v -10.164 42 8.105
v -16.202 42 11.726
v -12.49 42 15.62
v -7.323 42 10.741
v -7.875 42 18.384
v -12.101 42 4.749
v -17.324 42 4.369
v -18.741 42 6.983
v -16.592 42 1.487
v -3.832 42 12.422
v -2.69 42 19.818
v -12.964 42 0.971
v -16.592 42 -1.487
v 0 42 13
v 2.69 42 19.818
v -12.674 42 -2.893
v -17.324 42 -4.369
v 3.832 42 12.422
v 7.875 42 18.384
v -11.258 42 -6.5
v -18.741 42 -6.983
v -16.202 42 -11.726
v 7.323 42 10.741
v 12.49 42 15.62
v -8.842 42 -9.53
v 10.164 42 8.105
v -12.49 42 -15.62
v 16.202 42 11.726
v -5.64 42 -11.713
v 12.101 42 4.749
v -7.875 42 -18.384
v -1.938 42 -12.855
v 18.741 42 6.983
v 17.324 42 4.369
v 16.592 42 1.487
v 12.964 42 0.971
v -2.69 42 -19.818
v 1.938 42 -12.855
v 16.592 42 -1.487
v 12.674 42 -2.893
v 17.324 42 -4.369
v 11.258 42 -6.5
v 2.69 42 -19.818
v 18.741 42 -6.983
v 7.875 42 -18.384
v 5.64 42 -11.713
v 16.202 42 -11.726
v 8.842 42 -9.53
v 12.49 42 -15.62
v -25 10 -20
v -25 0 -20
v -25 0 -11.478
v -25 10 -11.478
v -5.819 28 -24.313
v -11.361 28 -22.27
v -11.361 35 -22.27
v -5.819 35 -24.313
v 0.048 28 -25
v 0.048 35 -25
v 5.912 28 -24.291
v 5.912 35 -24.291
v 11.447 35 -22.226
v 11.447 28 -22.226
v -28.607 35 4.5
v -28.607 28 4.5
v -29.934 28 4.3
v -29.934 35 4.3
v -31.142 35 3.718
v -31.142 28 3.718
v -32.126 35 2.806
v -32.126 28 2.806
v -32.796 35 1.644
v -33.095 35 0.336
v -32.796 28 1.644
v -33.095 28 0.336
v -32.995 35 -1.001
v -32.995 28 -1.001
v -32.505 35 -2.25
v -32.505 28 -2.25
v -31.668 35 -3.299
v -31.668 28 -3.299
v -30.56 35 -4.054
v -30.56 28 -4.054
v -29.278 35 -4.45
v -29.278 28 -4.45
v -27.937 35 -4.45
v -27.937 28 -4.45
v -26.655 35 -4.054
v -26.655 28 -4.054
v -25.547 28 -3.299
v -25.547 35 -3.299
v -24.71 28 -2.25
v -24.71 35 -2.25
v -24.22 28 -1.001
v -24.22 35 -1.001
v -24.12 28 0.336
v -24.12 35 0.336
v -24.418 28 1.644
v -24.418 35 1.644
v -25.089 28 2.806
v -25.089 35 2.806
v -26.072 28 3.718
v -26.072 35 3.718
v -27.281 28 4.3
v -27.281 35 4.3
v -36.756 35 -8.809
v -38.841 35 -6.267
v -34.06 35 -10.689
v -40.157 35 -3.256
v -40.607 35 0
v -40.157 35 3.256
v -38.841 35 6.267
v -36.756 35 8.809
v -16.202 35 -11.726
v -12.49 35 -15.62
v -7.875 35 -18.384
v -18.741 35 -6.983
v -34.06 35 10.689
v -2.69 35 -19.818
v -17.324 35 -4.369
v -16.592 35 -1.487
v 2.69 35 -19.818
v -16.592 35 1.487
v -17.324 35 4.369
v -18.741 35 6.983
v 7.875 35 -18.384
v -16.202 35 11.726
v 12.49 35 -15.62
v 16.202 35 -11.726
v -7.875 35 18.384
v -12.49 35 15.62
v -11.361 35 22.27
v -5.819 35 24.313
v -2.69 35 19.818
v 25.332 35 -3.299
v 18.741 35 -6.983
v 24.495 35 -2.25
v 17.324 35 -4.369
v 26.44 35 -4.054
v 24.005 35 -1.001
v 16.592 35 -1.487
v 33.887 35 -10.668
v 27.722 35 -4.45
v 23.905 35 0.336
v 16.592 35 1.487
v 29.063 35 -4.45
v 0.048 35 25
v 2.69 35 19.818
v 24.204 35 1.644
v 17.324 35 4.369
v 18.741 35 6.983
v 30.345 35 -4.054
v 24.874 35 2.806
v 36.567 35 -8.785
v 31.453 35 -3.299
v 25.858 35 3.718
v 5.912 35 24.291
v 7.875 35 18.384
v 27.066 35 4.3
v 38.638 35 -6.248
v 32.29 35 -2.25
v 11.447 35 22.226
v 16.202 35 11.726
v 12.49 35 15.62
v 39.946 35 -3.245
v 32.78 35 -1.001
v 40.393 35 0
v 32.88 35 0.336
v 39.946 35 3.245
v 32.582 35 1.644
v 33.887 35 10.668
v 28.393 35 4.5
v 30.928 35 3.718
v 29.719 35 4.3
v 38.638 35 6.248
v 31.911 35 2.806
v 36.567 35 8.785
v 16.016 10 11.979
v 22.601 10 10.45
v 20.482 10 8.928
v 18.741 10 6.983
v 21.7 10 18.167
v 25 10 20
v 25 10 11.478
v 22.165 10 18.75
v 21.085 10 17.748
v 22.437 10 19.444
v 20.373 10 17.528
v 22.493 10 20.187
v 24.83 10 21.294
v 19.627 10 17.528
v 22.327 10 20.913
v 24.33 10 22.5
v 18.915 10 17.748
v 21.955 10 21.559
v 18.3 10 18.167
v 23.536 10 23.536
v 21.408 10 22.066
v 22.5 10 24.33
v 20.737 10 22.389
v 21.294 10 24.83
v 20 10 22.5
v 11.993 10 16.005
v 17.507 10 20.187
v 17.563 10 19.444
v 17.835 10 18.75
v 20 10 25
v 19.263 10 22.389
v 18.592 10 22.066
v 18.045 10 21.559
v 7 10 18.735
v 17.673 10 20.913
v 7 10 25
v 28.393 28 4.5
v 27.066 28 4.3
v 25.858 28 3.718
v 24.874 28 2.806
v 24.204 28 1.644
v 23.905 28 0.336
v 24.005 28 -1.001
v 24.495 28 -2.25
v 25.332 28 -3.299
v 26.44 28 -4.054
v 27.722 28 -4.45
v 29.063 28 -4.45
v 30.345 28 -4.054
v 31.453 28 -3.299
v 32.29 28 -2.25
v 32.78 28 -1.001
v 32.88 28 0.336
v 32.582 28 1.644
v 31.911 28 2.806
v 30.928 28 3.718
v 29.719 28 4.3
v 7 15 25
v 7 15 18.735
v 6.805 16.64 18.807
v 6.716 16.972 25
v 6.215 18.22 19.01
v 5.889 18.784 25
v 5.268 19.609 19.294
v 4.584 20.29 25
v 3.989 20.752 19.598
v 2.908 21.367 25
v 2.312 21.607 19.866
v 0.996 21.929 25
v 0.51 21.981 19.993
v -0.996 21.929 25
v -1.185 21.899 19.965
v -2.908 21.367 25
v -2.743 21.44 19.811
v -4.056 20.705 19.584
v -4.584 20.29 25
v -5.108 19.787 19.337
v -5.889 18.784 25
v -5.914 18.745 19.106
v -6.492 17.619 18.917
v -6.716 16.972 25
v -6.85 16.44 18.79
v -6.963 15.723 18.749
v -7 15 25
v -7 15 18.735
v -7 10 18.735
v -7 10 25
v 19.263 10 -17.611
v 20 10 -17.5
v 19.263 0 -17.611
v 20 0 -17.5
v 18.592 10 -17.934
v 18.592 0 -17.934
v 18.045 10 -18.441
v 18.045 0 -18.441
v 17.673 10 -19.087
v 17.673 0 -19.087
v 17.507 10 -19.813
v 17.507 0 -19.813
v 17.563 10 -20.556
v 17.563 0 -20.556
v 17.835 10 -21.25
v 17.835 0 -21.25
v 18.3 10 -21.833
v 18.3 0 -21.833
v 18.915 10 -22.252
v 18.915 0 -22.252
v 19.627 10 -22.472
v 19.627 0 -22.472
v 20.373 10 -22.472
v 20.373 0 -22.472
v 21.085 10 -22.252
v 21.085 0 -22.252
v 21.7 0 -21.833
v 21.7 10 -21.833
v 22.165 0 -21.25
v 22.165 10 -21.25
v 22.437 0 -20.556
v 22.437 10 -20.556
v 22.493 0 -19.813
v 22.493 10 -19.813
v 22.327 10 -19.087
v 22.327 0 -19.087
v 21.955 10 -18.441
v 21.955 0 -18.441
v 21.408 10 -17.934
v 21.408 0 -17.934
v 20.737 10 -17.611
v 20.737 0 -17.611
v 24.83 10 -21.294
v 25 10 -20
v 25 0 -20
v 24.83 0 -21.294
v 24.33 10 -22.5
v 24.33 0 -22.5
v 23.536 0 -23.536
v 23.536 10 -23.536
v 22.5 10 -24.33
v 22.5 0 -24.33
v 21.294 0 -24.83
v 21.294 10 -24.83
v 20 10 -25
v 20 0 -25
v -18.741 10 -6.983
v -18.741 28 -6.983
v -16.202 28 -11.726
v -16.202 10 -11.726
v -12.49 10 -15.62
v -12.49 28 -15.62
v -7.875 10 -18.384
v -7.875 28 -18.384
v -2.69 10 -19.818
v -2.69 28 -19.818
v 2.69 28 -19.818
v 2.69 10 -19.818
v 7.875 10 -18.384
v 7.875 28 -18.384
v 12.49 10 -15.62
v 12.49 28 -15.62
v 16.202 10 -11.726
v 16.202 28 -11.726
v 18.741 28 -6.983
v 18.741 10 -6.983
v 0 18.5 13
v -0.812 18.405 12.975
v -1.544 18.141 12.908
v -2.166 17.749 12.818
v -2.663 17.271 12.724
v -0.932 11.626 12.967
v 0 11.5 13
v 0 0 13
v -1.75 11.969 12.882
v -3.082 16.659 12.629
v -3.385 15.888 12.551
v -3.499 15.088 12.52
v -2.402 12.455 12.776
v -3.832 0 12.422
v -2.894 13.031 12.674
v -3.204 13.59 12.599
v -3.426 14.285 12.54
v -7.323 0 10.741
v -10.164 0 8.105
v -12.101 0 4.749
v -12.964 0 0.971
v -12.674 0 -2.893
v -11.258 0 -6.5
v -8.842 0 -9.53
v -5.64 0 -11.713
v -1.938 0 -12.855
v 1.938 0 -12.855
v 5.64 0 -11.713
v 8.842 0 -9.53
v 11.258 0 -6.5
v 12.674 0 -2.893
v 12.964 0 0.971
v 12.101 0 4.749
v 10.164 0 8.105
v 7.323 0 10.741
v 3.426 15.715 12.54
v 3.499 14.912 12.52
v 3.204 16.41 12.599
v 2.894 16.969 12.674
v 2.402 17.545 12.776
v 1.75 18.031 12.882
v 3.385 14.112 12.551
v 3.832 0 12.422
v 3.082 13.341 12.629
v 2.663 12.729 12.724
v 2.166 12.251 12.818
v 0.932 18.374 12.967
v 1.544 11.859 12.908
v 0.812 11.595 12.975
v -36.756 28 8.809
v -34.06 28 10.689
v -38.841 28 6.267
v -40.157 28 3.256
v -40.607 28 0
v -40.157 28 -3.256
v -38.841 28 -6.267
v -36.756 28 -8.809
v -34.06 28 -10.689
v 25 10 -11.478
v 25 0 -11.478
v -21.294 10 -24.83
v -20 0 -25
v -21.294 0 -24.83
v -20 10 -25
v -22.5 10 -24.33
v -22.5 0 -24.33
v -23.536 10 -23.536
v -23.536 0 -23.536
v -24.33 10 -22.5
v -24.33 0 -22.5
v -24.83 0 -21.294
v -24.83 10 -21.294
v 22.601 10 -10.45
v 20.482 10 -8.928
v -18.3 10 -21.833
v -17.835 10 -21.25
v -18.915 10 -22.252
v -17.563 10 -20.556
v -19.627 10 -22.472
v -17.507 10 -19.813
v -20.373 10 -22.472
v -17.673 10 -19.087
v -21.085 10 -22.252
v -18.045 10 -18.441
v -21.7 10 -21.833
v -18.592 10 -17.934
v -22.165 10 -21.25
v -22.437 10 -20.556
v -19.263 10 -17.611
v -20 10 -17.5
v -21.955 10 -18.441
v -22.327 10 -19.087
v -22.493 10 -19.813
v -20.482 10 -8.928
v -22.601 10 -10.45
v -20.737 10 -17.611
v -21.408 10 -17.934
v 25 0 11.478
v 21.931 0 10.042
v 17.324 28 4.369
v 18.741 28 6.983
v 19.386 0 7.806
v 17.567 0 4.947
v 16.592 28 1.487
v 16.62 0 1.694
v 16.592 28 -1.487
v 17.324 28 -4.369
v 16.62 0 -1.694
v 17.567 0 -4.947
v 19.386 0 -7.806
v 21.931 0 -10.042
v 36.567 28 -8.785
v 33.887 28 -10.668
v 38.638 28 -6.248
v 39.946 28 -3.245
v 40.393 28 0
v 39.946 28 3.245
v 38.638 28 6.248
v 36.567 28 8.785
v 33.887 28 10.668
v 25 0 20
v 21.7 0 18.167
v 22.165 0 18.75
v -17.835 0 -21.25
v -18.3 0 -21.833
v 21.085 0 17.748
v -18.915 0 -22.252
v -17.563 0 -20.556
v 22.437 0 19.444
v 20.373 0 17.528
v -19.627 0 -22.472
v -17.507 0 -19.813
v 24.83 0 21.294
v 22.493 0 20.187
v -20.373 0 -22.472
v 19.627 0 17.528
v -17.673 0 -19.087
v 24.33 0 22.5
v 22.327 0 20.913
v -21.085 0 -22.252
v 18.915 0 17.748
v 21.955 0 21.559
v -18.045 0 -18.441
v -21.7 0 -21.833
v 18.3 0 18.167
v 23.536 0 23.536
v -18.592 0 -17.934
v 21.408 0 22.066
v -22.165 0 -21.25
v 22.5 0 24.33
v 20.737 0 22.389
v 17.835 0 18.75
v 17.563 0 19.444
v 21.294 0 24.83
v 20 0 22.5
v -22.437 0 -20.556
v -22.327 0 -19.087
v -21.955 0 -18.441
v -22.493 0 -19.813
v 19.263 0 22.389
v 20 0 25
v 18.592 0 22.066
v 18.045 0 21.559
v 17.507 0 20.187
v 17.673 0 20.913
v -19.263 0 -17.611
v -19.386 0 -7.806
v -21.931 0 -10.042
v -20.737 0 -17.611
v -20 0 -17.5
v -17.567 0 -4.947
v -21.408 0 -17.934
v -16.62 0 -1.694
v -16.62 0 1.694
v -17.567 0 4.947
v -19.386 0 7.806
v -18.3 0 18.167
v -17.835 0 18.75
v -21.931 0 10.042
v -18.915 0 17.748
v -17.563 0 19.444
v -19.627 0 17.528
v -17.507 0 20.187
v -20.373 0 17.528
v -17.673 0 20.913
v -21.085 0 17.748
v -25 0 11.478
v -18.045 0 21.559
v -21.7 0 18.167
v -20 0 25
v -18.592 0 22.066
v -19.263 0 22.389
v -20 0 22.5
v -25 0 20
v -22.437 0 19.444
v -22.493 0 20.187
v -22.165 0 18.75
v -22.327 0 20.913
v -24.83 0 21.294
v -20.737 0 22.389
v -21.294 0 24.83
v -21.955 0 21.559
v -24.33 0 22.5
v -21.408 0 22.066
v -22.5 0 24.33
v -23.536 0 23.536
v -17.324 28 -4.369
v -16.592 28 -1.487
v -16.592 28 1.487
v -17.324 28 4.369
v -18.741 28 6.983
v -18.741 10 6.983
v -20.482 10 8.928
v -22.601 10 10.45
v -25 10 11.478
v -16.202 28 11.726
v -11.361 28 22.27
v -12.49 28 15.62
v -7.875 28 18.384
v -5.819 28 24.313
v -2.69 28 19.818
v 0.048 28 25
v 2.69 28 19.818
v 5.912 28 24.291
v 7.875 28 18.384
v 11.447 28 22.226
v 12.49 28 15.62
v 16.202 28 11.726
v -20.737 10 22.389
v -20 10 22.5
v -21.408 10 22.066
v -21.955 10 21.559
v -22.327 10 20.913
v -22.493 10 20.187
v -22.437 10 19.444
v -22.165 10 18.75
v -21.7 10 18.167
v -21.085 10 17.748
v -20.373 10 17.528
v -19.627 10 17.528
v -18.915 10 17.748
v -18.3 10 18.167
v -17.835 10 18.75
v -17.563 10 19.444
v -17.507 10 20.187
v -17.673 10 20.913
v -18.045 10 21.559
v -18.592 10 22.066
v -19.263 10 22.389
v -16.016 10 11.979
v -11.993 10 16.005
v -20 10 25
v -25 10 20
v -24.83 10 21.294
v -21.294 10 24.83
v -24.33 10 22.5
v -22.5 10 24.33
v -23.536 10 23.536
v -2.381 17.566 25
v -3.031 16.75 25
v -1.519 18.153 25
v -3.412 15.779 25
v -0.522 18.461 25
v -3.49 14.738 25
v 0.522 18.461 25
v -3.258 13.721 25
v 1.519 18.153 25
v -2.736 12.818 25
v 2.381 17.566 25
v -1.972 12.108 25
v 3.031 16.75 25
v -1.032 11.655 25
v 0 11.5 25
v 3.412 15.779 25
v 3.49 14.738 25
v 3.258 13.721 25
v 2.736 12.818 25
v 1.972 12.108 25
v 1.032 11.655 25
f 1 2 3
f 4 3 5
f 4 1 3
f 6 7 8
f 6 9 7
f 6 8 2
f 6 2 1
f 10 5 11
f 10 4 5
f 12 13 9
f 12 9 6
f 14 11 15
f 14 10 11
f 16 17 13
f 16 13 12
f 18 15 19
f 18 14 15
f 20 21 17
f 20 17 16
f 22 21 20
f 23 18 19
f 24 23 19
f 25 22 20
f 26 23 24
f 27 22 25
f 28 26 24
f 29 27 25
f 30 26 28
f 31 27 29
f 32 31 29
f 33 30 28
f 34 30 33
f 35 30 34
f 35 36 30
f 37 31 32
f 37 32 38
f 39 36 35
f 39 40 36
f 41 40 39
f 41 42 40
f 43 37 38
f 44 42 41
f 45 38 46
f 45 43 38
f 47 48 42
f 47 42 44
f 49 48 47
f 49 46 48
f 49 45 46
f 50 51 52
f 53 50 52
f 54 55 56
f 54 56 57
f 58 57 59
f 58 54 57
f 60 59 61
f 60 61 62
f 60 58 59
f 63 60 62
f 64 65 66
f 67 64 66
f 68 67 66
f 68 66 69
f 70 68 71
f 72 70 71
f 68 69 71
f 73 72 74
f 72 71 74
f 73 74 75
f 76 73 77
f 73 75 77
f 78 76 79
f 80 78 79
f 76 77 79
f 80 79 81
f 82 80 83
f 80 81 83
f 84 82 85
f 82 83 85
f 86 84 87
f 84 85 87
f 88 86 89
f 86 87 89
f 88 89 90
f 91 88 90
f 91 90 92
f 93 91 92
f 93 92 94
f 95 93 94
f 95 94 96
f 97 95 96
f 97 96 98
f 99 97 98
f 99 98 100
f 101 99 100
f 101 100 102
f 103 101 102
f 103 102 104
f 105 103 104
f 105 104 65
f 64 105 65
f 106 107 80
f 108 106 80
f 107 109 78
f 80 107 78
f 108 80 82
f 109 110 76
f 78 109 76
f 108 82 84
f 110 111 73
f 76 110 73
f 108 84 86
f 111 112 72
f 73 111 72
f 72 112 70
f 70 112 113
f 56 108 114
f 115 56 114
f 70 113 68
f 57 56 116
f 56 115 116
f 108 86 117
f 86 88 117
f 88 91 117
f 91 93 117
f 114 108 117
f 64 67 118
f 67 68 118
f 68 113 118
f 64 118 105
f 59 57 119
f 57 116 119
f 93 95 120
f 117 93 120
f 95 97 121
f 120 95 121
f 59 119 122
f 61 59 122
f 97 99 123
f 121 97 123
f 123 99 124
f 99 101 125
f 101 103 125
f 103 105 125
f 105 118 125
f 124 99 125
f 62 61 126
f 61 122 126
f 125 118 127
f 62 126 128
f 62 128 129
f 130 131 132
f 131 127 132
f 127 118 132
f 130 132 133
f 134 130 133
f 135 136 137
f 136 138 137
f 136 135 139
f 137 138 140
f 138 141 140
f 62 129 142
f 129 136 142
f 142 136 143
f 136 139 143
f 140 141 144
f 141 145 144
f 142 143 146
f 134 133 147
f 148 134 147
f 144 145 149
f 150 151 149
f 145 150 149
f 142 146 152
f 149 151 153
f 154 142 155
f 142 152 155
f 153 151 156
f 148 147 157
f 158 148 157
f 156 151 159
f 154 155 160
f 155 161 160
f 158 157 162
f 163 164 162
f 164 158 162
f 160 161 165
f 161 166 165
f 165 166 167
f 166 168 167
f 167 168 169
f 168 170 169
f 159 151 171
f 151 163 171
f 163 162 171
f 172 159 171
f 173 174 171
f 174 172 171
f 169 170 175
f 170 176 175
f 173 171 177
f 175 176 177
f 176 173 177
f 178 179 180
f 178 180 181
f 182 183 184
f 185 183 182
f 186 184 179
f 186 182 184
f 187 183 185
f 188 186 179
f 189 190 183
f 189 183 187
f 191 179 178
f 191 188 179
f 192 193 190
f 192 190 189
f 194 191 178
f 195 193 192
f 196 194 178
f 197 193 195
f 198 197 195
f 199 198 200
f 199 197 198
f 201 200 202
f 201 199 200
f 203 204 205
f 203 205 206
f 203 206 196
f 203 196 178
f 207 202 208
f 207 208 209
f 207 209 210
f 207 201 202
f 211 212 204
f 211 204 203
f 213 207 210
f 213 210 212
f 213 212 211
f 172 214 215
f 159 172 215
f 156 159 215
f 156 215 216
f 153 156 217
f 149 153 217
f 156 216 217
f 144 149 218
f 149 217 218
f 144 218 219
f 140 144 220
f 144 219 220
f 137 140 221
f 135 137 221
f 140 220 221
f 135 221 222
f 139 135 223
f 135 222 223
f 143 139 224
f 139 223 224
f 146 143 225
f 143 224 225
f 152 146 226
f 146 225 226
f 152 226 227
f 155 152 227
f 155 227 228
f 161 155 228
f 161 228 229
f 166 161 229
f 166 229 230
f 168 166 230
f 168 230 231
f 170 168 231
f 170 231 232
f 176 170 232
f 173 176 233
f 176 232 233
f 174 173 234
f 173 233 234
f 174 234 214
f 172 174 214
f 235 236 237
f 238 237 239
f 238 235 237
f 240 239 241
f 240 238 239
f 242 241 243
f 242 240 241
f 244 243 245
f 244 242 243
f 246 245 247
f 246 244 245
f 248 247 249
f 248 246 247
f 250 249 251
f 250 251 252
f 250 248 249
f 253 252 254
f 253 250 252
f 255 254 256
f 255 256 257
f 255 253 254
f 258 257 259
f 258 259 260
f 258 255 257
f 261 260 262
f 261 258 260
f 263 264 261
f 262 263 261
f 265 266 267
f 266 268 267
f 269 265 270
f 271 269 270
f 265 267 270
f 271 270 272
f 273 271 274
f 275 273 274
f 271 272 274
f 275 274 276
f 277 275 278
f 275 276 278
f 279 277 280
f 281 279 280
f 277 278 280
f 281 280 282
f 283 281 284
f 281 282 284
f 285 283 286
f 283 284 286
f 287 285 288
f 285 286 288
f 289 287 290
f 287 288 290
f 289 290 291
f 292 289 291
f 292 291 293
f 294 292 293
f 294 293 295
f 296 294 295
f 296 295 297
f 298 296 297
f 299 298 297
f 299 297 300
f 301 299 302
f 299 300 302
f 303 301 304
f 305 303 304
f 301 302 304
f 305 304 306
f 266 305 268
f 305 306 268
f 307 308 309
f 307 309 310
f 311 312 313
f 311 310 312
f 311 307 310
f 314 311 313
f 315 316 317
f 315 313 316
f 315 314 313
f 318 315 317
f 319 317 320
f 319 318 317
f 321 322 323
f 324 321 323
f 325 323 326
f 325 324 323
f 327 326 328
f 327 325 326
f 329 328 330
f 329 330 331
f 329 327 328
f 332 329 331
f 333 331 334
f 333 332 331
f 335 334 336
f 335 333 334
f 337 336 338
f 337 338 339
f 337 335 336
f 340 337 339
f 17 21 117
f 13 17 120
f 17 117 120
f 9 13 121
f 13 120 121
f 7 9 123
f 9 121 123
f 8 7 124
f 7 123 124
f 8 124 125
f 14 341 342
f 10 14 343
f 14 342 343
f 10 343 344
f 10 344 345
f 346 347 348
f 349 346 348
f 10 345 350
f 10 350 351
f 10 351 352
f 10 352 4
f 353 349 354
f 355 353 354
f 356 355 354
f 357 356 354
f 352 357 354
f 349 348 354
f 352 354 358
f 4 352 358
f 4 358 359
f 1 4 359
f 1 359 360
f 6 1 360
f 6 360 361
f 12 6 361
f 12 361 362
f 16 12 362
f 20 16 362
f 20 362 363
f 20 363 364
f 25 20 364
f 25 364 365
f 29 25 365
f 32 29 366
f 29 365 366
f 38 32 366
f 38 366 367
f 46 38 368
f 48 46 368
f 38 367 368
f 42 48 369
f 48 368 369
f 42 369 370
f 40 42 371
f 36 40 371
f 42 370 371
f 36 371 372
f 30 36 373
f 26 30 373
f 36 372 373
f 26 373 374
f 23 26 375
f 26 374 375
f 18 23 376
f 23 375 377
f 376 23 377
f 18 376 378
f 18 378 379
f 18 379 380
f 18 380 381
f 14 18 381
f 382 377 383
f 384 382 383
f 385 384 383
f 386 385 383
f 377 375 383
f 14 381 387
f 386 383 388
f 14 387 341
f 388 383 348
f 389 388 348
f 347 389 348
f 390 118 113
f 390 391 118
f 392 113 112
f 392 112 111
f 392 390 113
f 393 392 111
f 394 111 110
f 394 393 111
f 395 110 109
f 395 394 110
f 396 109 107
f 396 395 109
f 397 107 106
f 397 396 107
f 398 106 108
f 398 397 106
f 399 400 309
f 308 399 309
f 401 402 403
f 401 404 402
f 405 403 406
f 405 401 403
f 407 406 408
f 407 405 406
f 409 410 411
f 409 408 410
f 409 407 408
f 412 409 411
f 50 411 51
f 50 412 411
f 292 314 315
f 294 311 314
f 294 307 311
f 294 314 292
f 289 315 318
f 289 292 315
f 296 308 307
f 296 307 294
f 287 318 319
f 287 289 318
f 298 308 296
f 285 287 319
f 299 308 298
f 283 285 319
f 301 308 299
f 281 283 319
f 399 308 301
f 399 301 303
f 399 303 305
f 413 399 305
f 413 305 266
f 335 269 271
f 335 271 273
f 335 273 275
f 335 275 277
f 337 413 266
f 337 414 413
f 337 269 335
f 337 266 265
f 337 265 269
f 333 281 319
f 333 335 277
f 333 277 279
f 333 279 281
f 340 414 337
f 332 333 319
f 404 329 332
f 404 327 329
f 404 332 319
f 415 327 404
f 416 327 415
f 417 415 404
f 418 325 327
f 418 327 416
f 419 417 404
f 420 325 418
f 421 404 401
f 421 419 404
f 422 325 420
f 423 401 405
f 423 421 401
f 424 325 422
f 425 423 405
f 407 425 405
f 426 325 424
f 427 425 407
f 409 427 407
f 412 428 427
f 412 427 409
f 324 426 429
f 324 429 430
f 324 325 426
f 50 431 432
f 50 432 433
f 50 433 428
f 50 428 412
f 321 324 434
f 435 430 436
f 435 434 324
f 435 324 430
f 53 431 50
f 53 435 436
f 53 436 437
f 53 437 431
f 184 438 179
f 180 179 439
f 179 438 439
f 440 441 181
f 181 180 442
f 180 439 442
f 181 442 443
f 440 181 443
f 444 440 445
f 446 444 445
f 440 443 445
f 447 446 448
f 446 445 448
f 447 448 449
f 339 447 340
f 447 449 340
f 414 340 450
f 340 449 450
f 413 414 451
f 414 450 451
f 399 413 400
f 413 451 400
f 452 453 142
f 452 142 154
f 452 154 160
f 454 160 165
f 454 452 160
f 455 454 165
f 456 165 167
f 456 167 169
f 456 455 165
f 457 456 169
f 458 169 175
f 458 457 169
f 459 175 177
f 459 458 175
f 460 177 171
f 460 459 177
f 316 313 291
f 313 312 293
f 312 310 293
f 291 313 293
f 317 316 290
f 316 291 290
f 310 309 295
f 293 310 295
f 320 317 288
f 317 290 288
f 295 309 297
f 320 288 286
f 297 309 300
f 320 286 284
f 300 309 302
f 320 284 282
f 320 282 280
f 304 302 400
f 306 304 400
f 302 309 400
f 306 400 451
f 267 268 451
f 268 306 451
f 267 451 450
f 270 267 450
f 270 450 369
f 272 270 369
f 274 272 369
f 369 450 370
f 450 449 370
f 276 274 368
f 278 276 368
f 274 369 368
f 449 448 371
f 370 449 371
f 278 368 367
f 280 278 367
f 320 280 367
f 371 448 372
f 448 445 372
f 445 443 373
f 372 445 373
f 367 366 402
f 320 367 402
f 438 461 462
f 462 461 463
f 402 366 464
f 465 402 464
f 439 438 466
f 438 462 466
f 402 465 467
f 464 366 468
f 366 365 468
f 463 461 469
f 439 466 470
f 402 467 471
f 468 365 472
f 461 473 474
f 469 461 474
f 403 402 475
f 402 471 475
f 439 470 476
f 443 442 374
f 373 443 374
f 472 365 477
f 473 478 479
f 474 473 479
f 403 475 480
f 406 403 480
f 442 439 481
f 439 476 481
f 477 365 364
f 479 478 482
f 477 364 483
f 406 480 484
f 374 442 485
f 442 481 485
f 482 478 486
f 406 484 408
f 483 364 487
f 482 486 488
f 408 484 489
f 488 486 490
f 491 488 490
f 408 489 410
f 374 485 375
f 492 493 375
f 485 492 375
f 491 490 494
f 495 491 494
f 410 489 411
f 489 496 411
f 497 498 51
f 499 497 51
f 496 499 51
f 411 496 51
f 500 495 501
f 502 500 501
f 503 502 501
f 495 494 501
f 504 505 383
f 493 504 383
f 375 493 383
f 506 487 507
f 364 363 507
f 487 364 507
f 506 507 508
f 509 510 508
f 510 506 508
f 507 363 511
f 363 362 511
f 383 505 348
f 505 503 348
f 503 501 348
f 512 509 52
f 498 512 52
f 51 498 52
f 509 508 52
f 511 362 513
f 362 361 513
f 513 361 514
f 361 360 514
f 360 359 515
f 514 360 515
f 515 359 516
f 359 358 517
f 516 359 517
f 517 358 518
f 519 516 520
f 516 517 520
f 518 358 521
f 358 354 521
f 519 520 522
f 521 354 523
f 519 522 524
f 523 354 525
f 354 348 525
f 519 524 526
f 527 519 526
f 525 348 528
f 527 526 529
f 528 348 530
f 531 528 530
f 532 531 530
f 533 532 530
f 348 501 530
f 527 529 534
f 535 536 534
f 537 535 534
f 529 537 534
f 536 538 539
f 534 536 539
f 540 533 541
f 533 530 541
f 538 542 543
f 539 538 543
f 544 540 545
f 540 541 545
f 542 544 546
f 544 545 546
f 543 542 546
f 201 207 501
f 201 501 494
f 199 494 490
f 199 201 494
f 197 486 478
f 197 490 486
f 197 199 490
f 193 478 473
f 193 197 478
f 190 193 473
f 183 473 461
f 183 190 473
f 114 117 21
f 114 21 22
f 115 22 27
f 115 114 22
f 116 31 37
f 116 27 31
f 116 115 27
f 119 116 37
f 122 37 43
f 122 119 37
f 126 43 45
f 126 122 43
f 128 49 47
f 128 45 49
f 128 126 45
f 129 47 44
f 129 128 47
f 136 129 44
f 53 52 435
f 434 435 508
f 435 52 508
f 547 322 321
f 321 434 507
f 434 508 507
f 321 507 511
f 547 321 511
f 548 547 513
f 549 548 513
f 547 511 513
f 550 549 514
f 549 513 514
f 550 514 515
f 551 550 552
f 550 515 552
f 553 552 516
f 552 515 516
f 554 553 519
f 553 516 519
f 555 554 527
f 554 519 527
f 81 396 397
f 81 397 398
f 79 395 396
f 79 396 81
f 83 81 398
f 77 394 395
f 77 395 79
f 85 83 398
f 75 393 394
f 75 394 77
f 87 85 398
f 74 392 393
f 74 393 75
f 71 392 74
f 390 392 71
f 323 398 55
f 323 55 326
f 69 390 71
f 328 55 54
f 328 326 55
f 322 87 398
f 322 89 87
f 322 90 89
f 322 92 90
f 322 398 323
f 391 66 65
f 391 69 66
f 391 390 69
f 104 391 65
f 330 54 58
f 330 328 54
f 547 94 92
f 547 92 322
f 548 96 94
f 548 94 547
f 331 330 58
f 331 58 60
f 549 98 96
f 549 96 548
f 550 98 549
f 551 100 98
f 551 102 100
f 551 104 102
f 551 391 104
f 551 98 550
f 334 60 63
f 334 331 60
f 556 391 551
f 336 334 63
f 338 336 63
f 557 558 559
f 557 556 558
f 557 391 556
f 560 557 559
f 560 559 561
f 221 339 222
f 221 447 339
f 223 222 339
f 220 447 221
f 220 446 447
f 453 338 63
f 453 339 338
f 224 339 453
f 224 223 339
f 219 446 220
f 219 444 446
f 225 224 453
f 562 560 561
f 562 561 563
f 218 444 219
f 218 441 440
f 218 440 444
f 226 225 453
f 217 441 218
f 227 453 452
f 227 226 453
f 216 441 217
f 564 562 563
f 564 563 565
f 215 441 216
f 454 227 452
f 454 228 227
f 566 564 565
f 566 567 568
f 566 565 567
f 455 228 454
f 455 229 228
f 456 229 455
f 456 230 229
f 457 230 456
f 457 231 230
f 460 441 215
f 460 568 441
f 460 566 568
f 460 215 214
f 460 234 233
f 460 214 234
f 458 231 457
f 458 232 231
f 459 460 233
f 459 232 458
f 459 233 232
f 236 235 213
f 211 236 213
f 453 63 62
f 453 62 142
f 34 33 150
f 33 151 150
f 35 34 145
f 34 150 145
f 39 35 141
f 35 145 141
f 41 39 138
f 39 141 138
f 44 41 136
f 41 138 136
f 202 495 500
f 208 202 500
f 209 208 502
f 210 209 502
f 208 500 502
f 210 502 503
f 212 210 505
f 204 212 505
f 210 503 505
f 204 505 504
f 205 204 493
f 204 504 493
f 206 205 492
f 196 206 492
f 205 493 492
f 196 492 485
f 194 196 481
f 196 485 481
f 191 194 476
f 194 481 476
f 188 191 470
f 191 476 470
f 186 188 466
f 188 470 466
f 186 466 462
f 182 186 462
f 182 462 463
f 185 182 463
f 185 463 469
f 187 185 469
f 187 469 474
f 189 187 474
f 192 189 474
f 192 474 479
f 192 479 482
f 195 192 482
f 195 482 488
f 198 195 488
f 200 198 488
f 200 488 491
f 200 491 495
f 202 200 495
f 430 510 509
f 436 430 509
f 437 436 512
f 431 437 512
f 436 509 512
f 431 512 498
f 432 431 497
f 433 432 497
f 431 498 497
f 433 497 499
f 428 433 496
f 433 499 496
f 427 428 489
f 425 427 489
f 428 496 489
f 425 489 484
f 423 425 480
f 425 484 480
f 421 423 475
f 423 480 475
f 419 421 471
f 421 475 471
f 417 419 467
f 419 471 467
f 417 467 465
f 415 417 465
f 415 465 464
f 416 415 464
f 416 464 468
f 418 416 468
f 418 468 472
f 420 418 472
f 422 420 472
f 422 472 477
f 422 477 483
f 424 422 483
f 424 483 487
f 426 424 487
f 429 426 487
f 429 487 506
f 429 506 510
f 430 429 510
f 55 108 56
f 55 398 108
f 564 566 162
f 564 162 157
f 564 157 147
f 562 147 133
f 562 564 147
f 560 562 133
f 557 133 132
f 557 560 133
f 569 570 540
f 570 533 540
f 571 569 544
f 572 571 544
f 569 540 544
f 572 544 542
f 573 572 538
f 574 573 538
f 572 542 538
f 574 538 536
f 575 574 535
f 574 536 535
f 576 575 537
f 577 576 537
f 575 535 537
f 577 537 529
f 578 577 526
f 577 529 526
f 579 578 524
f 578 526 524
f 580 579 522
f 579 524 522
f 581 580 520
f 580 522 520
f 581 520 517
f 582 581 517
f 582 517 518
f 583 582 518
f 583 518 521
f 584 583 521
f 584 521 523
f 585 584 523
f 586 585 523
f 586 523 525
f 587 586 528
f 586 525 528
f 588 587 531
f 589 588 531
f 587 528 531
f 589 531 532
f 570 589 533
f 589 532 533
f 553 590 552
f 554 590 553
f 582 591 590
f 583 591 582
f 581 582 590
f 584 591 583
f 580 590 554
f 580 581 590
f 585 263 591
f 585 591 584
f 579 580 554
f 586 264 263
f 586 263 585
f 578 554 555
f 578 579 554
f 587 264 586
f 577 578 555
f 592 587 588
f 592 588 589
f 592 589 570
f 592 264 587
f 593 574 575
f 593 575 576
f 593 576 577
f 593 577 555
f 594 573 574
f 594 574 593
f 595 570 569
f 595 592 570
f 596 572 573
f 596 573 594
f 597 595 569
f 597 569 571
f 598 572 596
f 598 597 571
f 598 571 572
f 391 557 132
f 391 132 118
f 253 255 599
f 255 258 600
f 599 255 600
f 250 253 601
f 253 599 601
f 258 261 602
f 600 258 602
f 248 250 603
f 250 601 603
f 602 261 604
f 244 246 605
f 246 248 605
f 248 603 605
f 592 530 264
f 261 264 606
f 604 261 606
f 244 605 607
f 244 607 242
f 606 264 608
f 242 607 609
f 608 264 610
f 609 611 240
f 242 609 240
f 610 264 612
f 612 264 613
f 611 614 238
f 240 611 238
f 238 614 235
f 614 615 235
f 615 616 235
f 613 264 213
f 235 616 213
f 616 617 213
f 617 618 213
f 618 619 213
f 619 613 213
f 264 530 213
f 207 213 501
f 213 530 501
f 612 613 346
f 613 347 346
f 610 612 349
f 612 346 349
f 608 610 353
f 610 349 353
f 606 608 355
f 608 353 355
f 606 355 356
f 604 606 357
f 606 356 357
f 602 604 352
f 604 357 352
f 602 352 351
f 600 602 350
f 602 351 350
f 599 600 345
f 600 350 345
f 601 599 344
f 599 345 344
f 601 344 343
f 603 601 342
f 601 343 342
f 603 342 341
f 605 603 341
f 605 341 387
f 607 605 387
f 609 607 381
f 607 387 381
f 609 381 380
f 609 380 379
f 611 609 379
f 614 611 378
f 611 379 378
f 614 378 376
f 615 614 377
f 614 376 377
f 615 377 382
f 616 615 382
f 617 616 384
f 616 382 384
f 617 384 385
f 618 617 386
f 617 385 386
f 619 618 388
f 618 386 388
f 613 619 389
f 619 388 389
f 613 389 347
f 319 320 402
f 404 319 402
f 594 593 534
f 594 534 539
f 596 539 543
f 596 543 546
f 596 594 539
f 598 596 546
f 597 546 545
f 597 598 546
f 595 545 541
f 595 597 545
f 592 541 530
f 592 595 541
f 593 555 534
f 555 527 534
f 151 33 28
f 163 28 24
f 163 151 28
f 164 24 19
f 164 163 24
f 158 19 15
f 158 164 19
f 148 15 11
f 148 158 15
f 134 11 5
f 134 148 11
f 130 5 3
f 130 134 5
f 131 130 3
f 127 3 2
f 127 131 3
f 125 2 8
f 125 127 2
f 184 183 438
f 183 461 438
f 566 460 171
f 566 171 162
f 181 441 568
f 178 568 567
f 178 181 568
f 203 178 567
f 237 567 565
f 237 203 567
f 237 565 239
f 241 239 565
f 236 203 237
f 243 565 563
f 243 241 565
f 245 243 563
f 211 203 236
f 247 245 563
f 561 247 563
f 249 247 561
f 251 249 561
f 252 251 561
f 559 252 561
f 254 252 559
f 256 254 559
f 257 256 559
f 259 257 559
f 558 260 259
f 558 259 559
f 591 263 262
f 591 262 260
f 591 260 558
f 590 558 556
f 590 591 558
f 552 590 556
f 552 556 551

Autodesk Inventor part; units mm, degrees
ref_plane "YZ Plane" through (0, 0, 0) normal (1, 0, 0) x (0, 1, 0)
ref_plane "XZ Plane" through (0, 0, 0) normal (0, 1, 0) x (-1, 0, 0)
sketch "Sketch1" plane through (0, 0, 0) normal (0, 1, 0) x (-1, 0, 0)
  line L0 (25, 25) -> (-25, 25)
  line L1 (-25, 25) -> (-25, -25)
  line L2 (-25, -25) -> (25, -25)
  line L3 (25, -25) -> (25, 25)
  line L4 (25, 25) -> (-25, -25) construction
  line L5 (-25, 25) -> (25, -25) construction
  point P0 (0, 0)
  dimension "d0" = 50
  dimension "d1" = 50
extrude "Extrusion1" add sketch "Sketch1" along normal blind 10
fillet "Fillet1" radius 5 4 edges at (-25, 5, -25) (-25, 5, 25) (25, 5, -25) (25, 5, 25)
sketch "Sketch2" plane through (0, 10, 0) normal (0, 1, 0) x (1, 0, 0)
  circle A0 centre (0, 0) radius 20
  dimension "d5" = 40
extrude "Extrusion2" add sketch "Sketch2" along normal blind 32
sketch "Sketch4" plane through (0, 0, 0) normal (0, -1, 0) x (1, 0, 0)
  circle A0 centre (-28.5, 0) radius 12
  line L0 (0, -36.4497) -> (0, 36.4497) projected
  circle A1 centre (28.5, 0) radius 12
  point P0 (0, 0)
  dimension "d14" = 12
  dimension "d15" = 57
extrude "Extrusion4" cut sketch "Sketch4" against normal through all
ref_plane "Work Plane1" through (0, 28, 0) normal (0, -1, 0) x (1, 0, 0)
sketch "Sketch3" plane through (0, 28, 0) normal (0, -1, 0) x (1, 0, 0)
  line L0 (-34.0605, -10.6894) -> (-11.3607, -22.2696)
  arc A0 (-11.3607, -22.2696) -> (11.4466, -22.2255) centre (0, 0) ccw
  line L1 (11.4466, -22.2255) -> (33.887, -10.6683)
  line L2 (33.887, -10.6683) -> (33.887, -10.6683)
  arc A1 (33.887, -10.6683) -> (33.887, 10.6683) centre (28.3926, 0) ccw
  line L3 (33.887, 10.6683) -> (11.4466, 22.2255)
  arc A2 (11.4466, 22.2255) -> (-11.3607, 22.2696) centre (0, 0) ccw
  arc A3 (-34.0605, 10.6894) -> (-34.0605, -10.6894) centre (-28.6074, 0) ccw
  line L4 (-11.3607, 22.2696) -> (-34.0605, 10.6894)
  dimension "d9" = 25
  dimension "d10" = 12
  dimension "d11" = 57
extrude "Extrusion3" add sketch "Sketch3" against normal blind 7
sketch "Sketch5" plane through (0, 42, 0) normal (0, 1, 0) x (1, 0, 0)
  arc A0 (18.7412, 6.9833) -> (-18.7412, 6.9833) centre (0, 0) ccw projected
hole "Hole1" at (0, 42, 0) direction (0, -1, 0) diameter 26 end through all
sketch "Sketch6" plane through (-20, 0, 25) normal (0, 0, 1) x (1, 0, 0)
  line L0 (0, 10) -> (40, 10) projected
  line L1 (0, 0) -> (40, 0) projected
  line L2 (1.2588, 10) -> (38.7412, 10) projected
  line L3 (13, 10) -> (13, 15)
  arc A0 (27, 15) -> (13, 15) centre (20, 15) ccw
  line L4 (27, 15) -> (27, 10)
  point P0 (20, 0)
  point P1 (20, 0)
  point P2 (20, 0)
  dimension "d25" = 7
  dimension "d26" = 15
extrude "Extrusion5" add sketch "Sketch6" against normal up to surface
sketch "Sketch7" plane through (-20, 0, 25) normal (0, 0, 1) x (1, 0, 0)
  arc A0 (27, 15) -> (13, 15) centre (20, 15) ccw projected
  point P0 (20, 0)
hole "Hole2" at (0, 15, 25) direction (0, 0, -1) diameter 7 end up to surface
sketch "Sketch8" plane through (0, 10, 0) normal (0, 1, 0) x (1, 0, 0)
  arc A0 (-25, -20) -> (-20, -25) centre (-20, -20) ccw projected
  arc A1 (25, 11.4782) -> (18.7412, 6.9833) centre (28.5, 0) ccw projected
  line L0 (25, 11.4782) -> (25, 20) projected
  arc A2 (25, 20) -> (20, 25) centre (20, 20) ccw projected
  line L1 (20, 25) -> (-20, 25) projected
  arc A3 (-20, 25) -> (-25, 20) centre (-20, 20) ccw projected
  line L2 (-25, 20) -> (-25, 11.4782) projected
  arc A4 (-18.7412, 6.9833) -> (-25, 11.4782) centre (-28.5, 0) ccw projected
  arc A5 (18.7412, 6.9833) -> (-18.7412, 6.9833) centre (0, 0) ccw projected
  line L3 (7, -18.735) -> (7, -25) projected
  line L4 (7, -25) -> (20, -25) projected
  arc A6 (20, -25) -> (25, -20) centre (20, -20) ccw projected
  line L5 (25, -20) -> (25, -11.4782) projected
  arc A7 (18.7412, -6.9833) -> (25, -11.4782) centre (28.5, 0) ccw projected
  arc A8 (7, -18.735) -> (18.7412, -6.9833) centre (0, 0) ccw projected
hole "Hole3" at (-20, 10, 20) at (20, 10, 20) at (-20, 10, -20) at (20, 10, -20) direction (0, -1, 0) diameter 5 end through all
sketch "Sketch9" plane through (0, 35, 0) normal (0, 1, 0) x (1, 0, 0)
  arc A0 (-34.0605, 10.6894) -> (-34.0605, -10.6894) centre (-28.6074, 0) ccw projected
  arc A1 (33.887, -10.6683) -> (33.887, 10.6683) centre (28.3926, 0) ccw projected
  point P0 (0, 0)
  point P1 (-28.6074, 0)
hole "Hole4" at (-28.6074, 35, 0) at (28.3926, 35, 0) direction (0, -1, 0) diameter 9 end through all
properties part number "Part025. Connection body" material "Steel, Carbon"
